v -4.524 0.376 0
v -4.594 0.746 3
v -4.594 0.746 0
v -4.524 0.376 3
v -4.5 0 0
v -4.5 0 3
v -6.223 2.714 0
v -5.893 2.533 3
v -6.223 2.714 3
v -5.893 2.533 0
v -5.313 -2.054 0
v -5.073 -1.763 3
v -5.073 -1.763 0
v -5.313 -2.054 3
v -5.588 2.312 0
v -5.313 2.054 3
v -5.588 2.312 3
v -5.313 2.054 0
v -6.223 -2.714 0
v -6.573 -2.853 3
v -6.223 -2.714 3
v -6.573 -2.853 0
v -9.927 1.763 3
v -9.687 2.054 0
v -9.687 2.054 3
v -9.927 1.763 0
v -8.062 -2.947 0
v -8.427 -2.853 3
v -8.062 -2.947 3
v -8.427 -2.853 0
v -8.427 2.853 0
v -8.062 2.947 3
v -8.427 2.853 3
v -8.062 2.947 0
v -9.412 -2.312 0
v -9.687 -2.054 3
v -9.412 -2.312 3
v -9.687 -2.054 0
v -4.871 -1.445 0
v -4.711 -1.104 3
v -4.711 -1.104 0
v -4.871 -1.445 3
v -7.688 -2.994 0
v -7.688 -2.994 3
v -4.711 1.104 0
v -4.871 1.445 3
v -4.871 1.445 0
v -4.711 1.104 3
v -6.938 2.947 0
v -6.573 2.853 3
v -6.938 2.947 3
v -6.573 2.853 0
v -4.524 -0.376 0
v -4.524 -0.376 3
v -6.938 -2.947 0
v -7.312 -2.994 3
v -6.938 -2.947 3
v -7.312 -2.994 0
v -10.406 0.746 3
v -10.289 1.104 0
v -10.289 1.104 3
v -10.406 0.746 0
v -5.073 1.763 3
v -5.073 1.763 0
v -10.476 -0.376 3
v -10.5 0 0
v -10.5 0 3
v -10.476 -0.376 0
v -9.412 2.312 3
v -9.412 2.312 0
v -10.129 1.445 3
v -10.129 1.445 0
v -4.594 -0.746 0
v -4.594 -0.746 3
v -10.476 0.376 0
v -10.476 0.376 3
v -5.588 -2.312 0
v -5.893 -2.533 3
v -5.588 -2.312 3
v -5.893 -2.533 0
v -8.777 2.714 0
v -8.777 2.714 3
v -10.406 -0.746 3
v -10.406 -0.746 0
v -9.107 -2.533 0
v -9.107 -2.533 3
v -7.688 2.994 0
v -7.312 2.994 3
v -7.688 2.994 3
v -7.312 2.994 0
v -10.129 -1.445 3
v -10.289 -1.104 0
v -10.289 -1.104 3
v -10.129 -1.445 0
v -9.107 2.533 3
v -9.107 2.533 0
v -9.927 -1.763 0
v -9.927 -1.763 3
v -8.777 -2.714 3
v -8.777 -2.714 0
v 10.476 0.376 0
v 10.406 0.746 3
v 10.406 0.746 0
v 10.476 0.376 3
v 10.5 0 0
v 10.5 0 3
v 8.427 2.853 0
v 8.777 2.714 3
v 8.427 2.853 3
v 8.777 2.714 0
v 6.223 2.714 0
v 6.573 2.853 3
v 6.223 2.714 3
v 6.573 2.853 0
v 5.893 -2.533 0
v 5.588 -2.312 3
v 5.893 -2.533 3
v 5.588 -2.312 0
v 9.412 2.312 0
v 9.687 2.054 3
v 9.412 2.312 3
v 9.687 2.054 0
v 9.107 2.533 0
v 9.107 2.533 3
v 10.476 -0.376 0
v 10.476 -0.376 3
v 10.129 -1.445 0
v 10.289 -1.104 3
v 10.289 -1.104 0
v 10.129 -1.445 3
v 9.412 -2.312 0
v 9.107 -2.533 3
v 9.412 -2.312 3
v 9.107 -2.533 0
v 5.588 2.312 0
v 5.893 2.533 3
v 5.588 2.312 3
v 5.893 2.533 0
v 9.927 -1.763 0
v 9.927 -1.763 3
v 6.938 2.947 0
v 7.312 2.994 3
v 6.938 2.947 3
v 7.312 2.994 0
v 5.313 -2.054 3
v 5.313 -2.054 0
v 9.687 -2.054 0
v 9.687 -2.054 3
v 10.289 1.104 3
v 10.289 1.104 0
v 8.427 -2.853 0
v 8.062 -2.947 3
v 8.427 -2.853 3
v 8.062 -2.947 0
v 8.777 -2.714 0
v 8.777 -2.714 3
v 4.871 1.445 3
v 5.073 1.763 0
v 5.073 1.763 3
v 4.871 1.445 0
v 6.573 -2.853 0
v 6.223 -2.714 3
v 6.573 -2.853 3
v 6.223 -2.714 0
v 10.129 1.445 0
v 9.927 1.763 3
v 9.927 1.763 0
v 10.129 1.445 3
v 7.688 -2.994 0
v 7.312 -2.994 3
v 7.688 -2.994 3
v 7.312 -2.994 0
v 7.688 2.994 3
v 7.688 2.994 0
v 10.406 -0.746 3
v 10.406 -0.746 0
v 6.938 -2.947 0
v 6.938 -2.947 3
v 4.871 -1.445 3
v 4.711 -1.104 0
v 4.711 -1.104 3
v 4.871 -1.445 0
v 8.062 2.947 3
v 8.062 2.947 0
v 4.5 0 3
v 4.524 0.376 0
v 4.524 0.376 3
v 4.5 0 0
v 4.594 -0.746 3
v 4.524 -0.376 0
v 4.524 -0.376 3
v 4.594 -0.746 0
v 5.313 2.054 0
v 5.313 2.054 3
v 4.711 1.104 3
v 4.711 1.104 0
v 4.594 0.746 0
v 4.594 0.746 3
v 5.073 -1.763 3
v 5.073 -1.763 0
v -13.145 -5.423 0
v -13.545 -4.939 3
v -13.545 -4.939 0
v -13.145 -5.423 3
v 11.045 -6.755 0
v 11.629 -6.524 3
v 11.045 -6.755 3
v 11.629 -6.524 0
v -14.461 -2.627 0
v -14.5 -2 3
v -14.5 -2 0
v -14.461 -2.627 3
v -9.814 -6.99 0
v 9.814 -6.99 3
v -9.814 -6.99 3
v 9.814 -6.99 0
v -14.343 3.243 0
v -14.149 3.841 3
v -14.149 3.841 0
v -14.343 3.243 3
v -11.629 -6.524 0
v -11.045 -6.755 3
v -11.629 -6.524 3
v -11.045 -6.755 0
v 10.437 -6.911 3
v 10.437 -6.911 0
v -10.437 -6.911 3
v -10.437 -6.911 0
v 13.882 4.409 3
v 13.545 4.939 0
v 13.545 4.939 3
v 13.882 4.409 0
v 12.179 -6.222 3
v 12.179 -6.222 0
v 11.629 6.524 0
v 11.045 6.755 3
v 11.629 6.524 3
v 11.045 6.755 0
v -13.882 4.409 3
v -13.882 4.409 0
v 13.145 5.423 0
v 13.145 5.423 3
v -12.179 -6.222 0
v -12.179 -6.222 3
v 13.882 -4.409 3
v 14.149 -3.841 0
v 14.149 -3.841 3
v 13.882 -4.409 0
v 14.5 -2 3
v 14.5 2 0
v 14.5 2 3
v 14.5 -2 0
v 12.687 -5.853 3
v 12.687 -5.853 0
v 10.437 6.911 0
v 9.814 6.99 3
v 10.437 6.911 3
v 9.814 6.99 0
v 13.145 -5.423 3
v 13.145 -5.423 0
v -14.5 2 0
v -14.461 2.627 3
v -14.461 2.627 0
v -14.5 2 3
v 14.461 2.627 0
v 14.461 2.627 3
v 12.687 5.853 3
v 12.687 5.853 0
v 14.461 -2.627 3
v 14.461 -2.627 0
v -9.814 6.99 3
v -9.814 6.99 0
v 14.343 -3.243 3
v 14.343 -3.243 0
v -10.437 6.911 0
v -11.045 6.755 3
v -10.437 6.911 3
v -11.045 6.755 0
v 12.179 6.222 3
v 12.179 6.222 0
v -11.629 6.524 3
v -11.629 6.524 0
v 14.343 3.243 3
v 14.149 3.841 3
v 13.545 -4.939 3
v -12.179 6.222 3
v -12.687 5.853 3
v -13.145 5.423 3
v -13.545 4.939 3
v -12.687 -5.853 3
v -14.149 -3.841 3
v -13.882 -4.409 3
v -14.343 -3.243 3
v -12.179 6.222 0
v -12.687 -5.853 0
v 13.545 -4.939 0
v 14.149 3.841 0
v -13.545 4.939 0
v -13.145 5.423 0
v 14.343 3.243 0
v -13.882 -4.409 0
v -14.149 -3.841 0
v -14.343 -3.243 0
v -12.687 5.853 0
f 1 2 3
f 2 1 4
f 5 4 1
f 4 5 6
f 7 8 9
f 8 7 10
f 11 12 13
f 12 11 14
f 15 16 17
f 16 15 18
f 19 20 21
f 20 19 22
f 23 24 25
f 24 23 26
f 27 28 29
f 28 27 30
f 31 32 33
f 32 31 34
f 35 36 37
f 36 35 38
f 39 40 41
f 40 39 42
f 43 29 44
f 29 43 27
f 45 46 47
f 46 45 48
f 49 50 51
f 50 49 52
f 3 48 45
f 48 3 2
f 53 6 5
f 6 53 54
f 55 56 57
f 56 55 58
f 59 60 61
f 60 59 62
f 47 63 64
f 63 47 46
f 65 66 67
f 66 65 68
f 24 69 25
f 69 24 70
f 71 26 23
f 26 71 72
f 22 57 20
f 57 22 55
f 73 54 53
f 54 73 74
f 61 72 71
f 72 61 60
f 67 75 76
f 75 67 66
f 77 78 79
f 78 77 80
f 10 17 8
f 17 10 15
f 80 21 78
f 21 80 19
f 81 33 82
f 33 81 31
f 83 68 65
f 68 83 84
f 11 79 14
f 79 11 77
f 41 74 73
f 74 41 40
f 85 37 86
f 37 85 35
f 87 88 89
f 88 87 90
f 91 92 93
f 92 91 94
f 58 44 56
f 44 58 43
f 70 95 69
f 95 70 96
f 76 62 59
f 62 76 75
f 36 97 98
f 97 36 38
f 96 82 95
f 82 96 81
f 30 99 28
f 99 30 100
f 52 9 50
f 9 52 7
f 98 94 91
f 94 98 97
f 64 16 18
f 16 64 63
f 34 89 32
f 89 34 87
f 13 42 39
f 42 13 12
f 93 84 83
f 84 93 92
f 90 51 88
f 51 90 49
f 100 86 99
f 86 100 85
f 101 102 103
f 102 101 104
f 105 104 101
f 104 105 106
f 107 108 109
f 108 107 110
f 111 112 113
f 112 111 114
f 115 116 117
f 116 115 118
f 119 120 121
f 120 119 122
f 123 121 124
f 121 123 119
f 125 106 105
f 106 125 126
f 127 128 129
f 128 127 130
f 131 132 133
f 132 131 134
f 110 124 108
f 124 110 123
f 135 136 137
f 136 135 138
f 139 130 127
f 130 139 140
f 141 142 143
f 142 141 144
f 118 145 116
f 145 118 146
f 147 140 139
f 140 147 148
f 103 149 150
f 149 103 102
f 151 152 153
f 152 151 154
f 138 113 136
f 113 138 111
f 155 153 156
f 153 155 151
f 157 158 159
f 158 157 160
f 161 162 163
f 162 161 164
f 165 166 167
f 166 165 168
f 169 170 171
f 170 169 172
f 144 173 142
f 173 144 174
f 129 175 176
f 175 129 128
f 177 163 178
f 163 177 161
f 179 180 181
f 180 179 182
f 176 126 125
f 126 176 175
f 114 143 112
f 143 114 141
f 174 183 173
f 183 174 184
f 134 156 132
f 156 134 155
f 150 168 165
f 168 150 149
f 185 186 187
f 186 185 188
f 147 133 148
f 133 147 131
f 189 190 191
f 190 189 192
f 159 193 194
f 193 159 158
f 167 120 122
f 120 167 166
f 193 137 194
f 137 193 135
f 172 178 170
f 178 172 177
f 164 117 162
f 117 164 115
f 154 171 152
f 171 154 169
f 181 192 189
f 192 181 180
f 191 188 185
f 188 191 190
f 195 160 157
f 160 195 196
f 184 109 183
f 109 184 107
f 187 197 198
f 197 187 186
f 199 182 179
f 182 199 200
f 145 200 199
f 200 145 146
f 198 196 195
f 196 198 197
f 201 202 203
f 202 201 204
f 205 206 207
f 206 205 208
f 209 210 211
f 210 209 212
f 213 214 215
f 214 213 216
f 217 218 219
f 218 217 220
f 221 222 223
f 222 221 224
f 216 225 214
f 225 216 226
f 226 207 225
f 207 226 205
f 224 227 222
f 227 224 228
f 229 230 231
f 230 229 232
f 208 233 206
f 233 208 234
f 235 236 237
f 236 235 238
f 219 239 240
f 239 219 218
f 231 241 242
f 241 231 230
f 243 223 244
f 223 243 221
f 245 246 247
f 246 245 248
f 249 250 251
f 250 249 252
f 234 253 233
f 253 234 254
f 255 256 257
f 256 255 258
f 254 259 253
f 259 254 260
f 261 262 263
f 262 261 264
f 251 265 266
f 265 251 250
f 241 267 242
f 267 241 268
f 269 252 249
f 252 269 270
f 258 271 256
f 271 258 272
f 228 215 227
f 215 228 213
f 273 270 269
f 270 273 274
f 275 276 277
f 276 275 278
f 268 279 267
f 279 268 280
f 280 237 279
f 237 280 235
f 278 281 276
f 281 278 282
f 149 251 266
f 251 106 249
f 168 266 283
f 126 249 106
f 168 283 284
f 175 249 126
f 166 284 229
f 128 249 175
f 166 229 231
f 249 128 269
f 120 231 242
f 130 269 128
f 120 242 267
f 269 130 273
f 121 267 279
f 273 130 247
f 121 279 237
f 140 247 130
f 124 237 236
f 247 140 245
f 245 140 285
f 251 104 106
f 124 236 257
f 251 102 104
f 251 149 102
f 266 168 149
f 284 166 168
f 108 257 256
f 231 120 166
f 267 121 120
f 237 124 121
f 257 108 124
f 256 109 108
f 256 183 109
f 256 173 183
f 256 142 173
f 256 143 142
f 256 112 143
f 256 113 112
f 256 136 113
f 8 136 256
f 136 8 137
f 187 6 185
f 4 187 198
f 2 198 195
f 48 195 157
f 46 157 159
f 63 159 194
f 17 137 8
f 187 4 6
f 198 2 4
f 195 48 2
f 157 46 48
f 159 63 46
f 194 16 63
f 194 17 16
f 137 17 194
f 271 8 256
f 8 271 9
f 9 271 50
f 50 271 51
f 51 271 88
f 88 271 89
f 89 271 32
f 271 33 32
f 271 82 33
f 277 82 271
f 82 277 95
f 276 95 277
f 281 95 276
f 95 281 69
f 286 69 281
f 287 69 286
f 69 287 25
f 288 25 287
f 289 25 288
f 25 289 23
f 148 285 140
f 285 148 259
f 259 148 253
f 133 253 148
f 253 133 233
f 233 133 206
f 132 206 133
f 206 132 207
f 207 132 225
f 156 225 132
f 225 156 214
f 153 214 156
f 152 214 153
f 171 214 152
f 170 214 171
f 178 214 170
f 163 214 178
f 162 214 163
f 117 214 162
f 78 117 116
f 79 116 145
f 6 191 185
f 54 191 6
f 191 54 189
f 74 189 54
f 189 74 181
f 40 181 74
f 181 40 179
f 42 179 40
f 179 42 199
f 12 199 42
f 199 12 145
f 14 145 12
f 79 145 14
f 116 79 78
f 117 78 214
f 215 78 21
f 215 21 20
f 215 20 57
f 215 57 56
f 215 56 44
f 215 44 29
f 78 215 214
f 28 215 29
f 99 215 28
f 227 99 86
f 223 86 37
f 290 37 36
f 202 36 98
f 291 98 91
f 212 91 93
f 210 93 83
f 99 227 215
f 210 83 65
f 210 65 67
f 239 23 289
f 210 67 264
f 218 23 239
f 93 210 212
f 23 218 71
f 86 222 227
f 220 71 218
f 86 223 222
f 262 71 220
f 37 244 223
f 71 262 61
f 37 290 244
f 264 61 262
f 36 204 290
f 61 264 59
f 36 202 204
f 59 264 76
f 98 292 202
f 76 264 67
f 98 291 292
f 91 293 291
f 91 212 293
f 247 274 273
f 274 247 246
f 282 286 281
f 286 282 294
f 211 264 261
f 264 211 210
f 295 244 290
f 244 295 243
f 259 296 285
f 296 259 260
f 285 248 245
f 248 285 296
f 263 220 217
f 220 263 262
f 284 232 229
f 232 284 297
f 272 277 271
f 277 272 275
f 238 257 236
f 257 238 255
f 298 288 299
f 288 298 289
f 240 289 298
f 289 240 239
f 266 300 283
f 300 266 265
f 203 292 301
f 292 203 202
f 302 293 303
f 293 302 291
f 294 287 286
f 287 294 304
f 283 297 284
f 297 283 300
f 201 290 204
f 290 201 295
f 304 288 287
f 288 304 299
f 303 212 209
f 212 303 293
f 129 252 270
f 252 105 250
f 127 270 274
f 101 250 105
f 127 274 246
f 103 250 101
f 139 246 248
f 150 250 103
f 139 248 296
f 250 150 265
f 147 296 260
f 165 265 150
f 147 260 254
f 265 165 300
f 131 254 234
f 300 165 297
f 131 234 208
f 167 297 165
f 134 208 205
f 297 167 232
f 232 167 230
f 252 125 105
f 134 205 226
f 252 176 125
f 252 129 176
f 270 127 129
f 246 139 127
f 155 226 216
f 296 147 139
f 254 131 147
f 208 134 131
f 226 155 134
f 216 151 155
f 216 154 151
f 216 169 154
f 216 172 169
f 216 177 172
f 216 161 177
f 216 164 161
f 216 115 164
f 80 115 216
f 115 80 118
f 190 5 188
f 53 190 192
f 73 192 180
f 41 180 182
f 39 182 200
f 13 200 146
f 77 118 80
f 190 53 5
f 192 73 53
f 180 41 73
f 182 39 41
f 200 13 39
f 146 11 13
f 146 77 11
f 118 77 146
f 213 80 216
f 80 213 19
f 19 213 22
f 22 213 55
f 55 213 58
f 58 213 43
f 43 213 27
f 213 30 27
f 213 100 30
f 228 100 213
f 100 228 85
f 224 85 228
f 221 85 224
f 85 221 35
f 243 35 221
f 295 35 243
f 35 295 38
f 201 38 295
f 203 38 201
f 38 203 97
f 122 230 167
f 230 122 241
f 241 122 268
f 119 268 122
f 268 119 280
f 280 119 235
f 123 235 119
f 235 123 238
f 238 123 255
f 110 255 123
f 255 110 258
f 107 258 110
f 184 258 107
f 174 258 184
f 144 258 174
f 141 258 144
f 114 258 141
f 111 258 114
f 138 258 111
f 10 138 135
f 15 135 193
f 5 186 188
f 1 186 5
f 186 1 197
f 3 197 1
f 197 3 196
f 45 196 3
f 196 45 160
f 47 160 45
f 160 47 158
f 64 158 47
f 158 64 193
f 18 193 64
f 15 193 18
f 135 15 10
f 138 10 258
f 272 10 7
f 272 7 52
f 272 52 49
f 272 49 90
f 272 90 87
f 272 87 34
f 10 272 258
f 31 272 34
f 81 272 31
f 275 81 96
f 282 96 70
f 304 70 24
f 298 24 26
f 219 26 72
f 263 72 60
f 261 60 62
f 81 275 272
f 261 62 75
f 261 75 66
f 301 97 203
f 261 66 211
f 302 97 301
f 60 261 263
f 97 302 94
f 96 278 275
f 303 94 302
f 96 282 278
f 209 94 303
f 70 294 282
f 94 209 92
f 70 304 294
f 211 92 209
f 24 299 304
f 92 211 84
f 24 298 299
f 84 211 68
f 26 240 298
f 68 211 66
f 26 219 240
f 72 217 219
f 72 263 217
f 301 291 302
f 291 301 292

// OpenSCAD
// Generated by SolidPython 1.1.3 on 2023-03-12 21:50:46
$fn = 50;


difference() {
	union() {
		translate(v = [0, 0, 0]) {
			rotate(a = [0, 0, 0]) {
				hull() {
					translate(v = [-9.5000000000, 2.0000000000, 0]) {
						rotate(a = [0, 0, 0]) {
							translate(v = [0, 0, 0]) {
								rotate(a = [0, 0, 0]) {
									cylinder(h = 3, r = 5);
								}
							}
						}
					}
					translate(v = [9.5000000000, 2.0000000000, 0]) {
						rotate(a = [0, 0, 0]) {
							translate(v = [0, 0, 0]) {
								rotate(a = [0, 0, 0]) {
									cylinder(h = 3, r = 5);
								}
							}
						}
					}
					translate(v = [-9.5000000000, -2.0000000000, 0]) {
						rotate(a = [0, 0, 0]) {
							translate(v = [0, 0, 0]) {
								rotate(a = [0, 0, 0]) {
									cylinder(h = 3, r = 5);
								}
							}
						}
					}
					translate(v = [9.5000000000, -2.0000000000, 0]) {
						rotate(a = [0, 0, 0]) {
							translate(v = [0, 0, 0]) {
								rotate(a = [0, 0, 0]) {
									cylinder(h = 3, r = 5);
								}
							}
						}
					}
				}
			}
		}
	}
	union() {
		translate(v = [-7.5000000000, 0.0000000000, 0]) {
			rotate(a = [0, 0, 0]) {
				translate(v = [0, 0, -50]) {
					rotate(a = [0, 0, 0]) {
						cylinder(h = 100, r = 3.0000000000);
					}
				}
			}
		}
		translate(v = [7.5000000000, 0.0000000000, 0]) {
			rotate(a = [0, 0, 0]) {
				translate(v = [0, 0, -50]) {
					rotate(a = [0, 0, 0]) {
						cylinder(h = 100, r = 3.0000000000);
					}
				}
			}
		}
	}
}
/***********************************************
*********      SolidPython code:      **********
************************************************
 
from solid import *
import os
import subprocess

import oomB

import opsc_library_gen

mode = "laser"
#mode = "3d_print"

defined_objects = {}

radius_dict = {}
countersunk_dict = {}


def set_mode(m):
    global mode
    mode = m
    radius_dict['M6'] = 6.5/2
    radius_dict['M3'] = 3.3/2
    if mode == "laser":
        radius_dict['M6'] = 6/2
        radius_dict['M3'] = 3/2

    countersunk_dict['M3'] = {}
    countersunk_dict['M3']['little_rad'] = radius_dict['M3']
    countersunk_dict['M3']['big_rad'] = (5.5+0.6)/2
    if mode == "laser":
        countersunk_dict['M3']['big_rad'] = (4.75+0.6)/2
        countersunk_dict['M3']['little_rad'] = (4.75+0.6)/2

    countersunk_dict['M3']['height'] = 1.7


def opsc_make_object(filename, objects, save_type="none",resolution=50, layers = 1, tilediff = 200, mode="laser", overwrite=True):
    if overwrite or not os.path.exists(filename):
        set_mode(mode)
        save_type = save_type.lower()
        os.makedirs(os.path.dirname(filename), exist_ok=True)
        final_object = opsc_get_object(objects, mode = mode)
        # Save the final object to the specified filename    
        scad_render_to_file(final_object, filename, file_header='$fn = %s;' % resolution, include_orig_code=True)
        if mode == "laser":
            filename_laser = filename.replace(".scad","-flat.scad")
            scad_render_to_file(getLaser(final_object, layers=layers, tilediff=tilediff), filename_laser, file_header='$fn = %s;' % resolution, include_orig_code=True)
            if save_type == "all":
                saveToAll(filename_laser)
            elif save_type == "dxf":
                saveToDxf(filename_laser)
        if save_type == "all":
            saveToAll(filename)
        elif save_type == "dxf":
            saveToDxf(filename)


def opsc_get_object(objects, mode = "laser"):
    # Create the solidpython objects only include the positive objects and if they don't have inclusion or their inclusion is either all or mode
    # Initialize an empty list to store the results
    positive_objects = []

    # Iterate over the "objects" list
    for obj in objects:
        # Check if the current object has a "type" key with a value of "positive"
        if obj['type'] == 'positive':
            # Check if the current object has an "inclusion" key and its value matches "mode",
            # or if the current object does not have an "inclusion" key at all
            if not 'inclusion' in obj or obj['inclusion'] == "all" or obj['inclusion'] == mode:
                # Call the "get_opsc_item" function with the current object as an argument
                opsc_item = get_opsc_item(obj)
                # Add the result to the "positive_objects" list
                positive_objects.append(opsc_item)
# Initialize an empty list to store the results
    negative_objects = []

    # Iterate over the "objects" list
    for obj in objects:
        # Check if the current object has a "type" key with a value of "negative"
        if obj['type'] == 'negative':
            # Check if the current object has an "inclusion" key and its value matches "mode",
            # or if the current object does not have an "inclusion" key at all
            if not 'inclusion' in obj or obj['inclusion'] == "all" or obj['inclusion'] == mode:
                # Call the "get_opsc_item" function with the current object as an argument
                opsc_item = get_opsc_item(obj)
                # Add the result to the "negative_objects" list
                negative_objects.append(opsc_item)
    
    #positive_objects = [get_opsc_item(obj) for obj in objects if obj['type'] == 'positive']
    #negative_objects = [get_opsc_item(obj) for obj in objects if obj['type'] == 'negative']
    # Union the positive objects
    positive_object = union()(*positive_objects)
    # Union the negative objects
    negative_object = union()(*negative_objects)
    # Create the final object by subtracting the negative objects from the positive objects
    return difference()(positive_object, negative_object)

def get_opsc_item(params):
    # A dictionary to map radius string values to numerical values
    #radius_dict = {'small': 5, 'medium': 10, 'large': 15}
    # An array of function names for basic shapes
    basic_shapes = ['cube', 'sphere', 'cylinder']
    
    # An array of function names for other shapes
    other_shapes = ['hole', 'slot', 'rounded_rectangle', 'countersunk']
    


    # Convert radius to r if present, and remove radius from the params dictionary
    if 'radius' in params:
        if isinstance(params['radius'], str):
            # Use the radius_dict to map the radius string value to a numerical value
            params['r'] = radius_dict[params['radius']]
        else:
            params['r'] = params['radius']
        del params['radius']
    

    # Check if the object type is a basic shape
    if params['shape'] in basic_shapes:
        # Remove shape and unexpected dictionary values
        allowed_keys = {'size', 'r', 'r1', 'r2', 'd', 'h', 'rw', 'rh', 'dw', 'dh'}
        shape_params = {k: v for k, v in params.items() if k in allowed_keys}

        # Call the corresponding function for the shape parameter, using ** notation to pass the shape_params dictionary as keyword arguments
        return get_opsc_transform(params,globals()[params['shape']](**shape_params))
    
    # If the object type is not a basic shape, check if it's a defined object or one of the other shapes
    elif params['shape'] in other_shapes:
        # Call the corresponding function for the shape parameter, passing the params dictionary as an argument
        p2 = copy.deepcopy(params)
        p2["pos"] = [0,0,0]
        return get_opsc_transform(params,globals()[params['shape']](p2))
    
    # If the object is not a basic shape or a defined object, try to import it from a .scad file
    else:
        obj = defined_objects[params['shape']]
        return get_opsc_transform(params,obj)

def get_opsc_transform(params, solid_obj):
    # Rotate the object based on the 'rot' field in the params dictionary, or the 'rotX', 'rotY', and 'rotZ' fields if 'rot' is not present
    rot = params.get('rot', [])
    if rot:
        rotX, rotY, rotZ = rot
    else:
        rotX = params.get('rotX', 0)
        rotY = params.get('rotY', 0)
        rotZ = params.get('rotZ', 0)
    solid_obj = rotate([rotX, rotY, rotZ])(solid_obj)

    # Translate the object based on the 'pos' field in the params dictionary, or the 'x', 'y', and 'z' fields if 'pos' is not present
    pos = params.get('pos', [])
    if pos:
        x, y, z = pos
    else:
        x = params.get('x', 0)
        y = params.get('y', 0)
        z = params.get('z', 0)
    solid_obj = translate([x, y, z])(solid_obj)
    return solid_obj


import random

def opsc_easy_array(type, shape, repeats, pos_start, shift_arr, **kwargs):
    for i in range(0,3):
        repeats.append(1)
        pos_start.append(0)
        shift_arr.append(0)
    return_objects = []

    for x in range(0,repeats[0]):
        for y in range(0,repeats[1]):
            for z in range(0,repeats[2]):
                return_objects.append(opsc_easy(type, shape, pos=[pos_start[0]+x*shift_arr[0],pos_start[1]+y*shift_arr[1],pos_start[2]+z*shift_arr[2]], **kwargs))
    return return_objects                



def opsc_easy(type, shape, **kwargs):
    obj = {
        'type': type,
        'shape': shape
    }
    for param in ['size', 'r', 'r1', 'r2', 'd', 'h', 'rw', 'rh', 'dw', 'dh', 'pos', 'x', 'y', 'z', 'rot', 'rotX', 'rotY', 'rotZ', "w", "inclusion"]:
        if param in kwargs:
            obj[param] = kwargs[param]
    return obj

def hole(params):
    p2 = copy.deepcopy(params)  
    # Check if the radius is a string and replace it with the corresponding value from the dictionary
    if isinstance(p2['r'], str):
        p2['r'] = radius_dict[p2['r']]
    
    # Set the height to 100 if not specified
    if 'h' not in p2:
        p2['h'] = 100
        p2["pos"] = [0,0,-50]
    p2["center"] = True
    # Create the cylinder object
    p2["shape"] = "cylinder"
    p2["type"] = "positive"

    return get_opsc_item(p2)

import copy

def countersunk(params):
    p2 = copy.deepcopy(params)
    counter_rad = p2['r']
    p2['r'] = radius_dict[p2['r']]
    hp = copy.deepcopy(p2)
    hp["type"] = "positive"
    hp["shape"] = "hole"
    del hp["rot"]
    hol = get_opsc_item(hp)
    
    cp = copy.deepcopy(p2)
    cp["h"] = countersunk_dict[counter_rad]["height"]
    cp["r2"] = countersunk_dict[counter_rad]["little_rad"]
    cp["r1"] = countersunk_dict[counter_rad]["big_rad"]
    del cp["r"]
    del cp["rot"]
    cp["type"] = "positive"
    cp["shape"] = "cylinder"
    cp["pos"] = [0,0,0]

    top = get_opsc_item(cp)
    return union()(hol,top)



def slot(params):  
    p2 = copy.deepcopy(params) 
    if isinstance(p2['r'], str):
        p2['r'] = radius_dict[p2['r']]
    p2["type"] = "positive"
    p2["shape"] = "hole"
    del p2["rot"]
    p2["pos"] = [0,0,0]
    left = copy.deepcopy(p2)
    right = copy.deepcopy(p2)
    left["pos"][0] = p2["w"] / 2 - p2["r"] 
    
    right["pos"][0] = -p2["w"] / 2 + p2["r"] 
    pass
    leftObj = get_opsc_item(left)
    rightObj = get_opsc_item(right)
    return hull()(leftObj, rightObj)

def rounded_rectangle(params):   
    p2 = copy.deepcopy(params) 
    p2["h"] = p2["size"][2]
    p2["pos"] = p2.get("pos", [0, 0, 0]) 
    p2["type"] = "positive"
    p2["shape"] = "hole"
    p2["pos"] = [0,0,0]
    
    if 'rot' in p2:
        del p2["rot"]   
    if 'r' not in p2:
        p2["r"] = 5 
    tl = copy.deepcopy(p2)
    tr = copy.deepcopy(p2)
    bl = copy.deepcopy(p2)
    br = copy.deepcopy(p2)
    tl["pos"][0] = -(p2["size"][0] - p2["r"]*2)/2
    tl["pos"][1] = (p2["size"][1] - p2["r"]*2)/2
    tr["pos"][0] = (p2["size"][0] - p2["r"]*2)/2
    tr["pos"][1] = (p2["size"][1] - p2["r"]*2)/2
    bl["pos"][0] = -(p2["size"][0] - p2["r"]*2)/2
    bl["pos"][1] = -(p2["size"][1] - p2["r"]*2)/2
    br["pos"][0] = (p2["size"][0] - p2["r"]*2)/2
    br["pos"][1] = -(p2["size"][1] - p2["r"]*2)/2
    del tl["size"]
    del tr["size"]
    del bl["size"]
    del br["size"]
    tlo = get_opsc_item(tl)
    tro = get_opsc_item(tr)
    blo = get_opsc_item(bl)
    bro = get_opsc_item(br)    
    return hull()(tlo, tro, blo, bro)



def import_scad_object(filename):
    # Import the .scad file and convert it to a solidpython object
    #filename = "parts"
    obj = import_scad(filename)
    return obj.main()
    


import os
import solid as solidpython

# A dictionary to store the defined objects


def load_scad_objects():
    opsc_library_gen.gen_library(defined_objects)

import random

def test(num_objects):
    objects = []
    for i in range(num_objects):
        # Choose a random shape
        #shape = random.choice(['cube', 'sphere', 'cylinder', 'hole', 'slot', "rounded_rectangle"])
        shape = random.choice(["rounded_rectangle"])

        # Choose a random type
        type = random.choice(['positive', 'negative'])
        
        # Create an empty object dictionary
        obj = {'shape': shape, 'type': type}
        
        # Set shape-specific parameters
        if obj['shape'] in ['cube']:
            obj['size'] =  [random.uniform(5, 15), random.uniform(5, 15), random.uniform(5, 15)]
        if obj['shape'] in ['rounded_rectangle']:
            obj['size'] =  [random.uniform(5, 15), random.uniform(5, 15), random.uniform(5, 15)]
            obj['r'] = random.uniform(0.5, 5)
        elif obj['shape'] == 'sphere':
            obj['r'] = random.uniform(5, 15)
        elif obj['shape'] in ['cylinder', 'hole']:
            obj['r'] = random.uniform(0.5, 5)
            obj['h'] = random.uniform(5, 15)
        elif obj['shape'] == 'slot':
            obj['r'] = random.uniform(0.5, 5)
            obj['h'] = random.uniform(5, 15)
            obj['w'] = random.uniform(5, 15)
        
        # Set a random position and rotation
        obj['pos'] = [random.uniform(-20, 20), random.uniform(-20, 20), random.uniform(-20, 20)]
        obj['rot'] = [random.uniform(-180, 180), random.uniform(-180, 180), random.uniform(-180, 180)]
        
        # Add the object to the list
        objects.append(obj)
    return objects

####### old file saving
def saveToAll(fileIn):
    saveToDxf(fileIn)
    saveToPng(fileIn)
    saveToStl(fileIn)
    saveToSvg(fileIn)

def saveToDxf(fileIn, fileOut="", copy_to_laser=True):
    if fileOut == "":
        fileOut = fileIn.replace(".scad",".dxf")
    saveToFile(fileIn, fileOut)


    
def saveToPng(fileIn, fileOut="",extra="--render"):
    if fileOut == "":
        fileOut = fileIn.replace(".scad",".png")
    saveToFile(fileIn, fileOut)

def saveToStl(fileIn, fileOut=""):
    if fileOut == "":
        fileOut = fileIn.replace(".scad",".stl")
    saveToFile(fileIn, fileOut)
    
def saveToSvg(fileIn, fileOut=""):
    if fileOut == "":
        fileOut = fileIn.replace(".scad",".svg")
    saveToFile(fileIn, fileOut)

def saveToFile(fileIn, fileOut,extra=""):
    #extra = extra + " --colorscheme Tomorrow"

    launchStr = 'openscad -o "' + fileOut + '"' + extra + ' "' + fileIn + '"'
    if ".png" in fileOut:
        launchStr = launchStr + " --render"
    print("            saveToFile launch string: " + launchStr)
    subprocess.run(launchStr)
    x=0

def getLaser(final_object,start=1.5,layers=1,thickness=3,tilediff=200):
        rv= []

        for x in range(layers):
            rv.append(translate([0,x*tilediff,0])(
                    projection()(
                        intersection()(translate([-500,-500,start+x*thickness])(cube(size=[1000,1000,0.1])),
                            final_object
                        )
                    )
            )
            )
            
        return union()(rv)

set_mode("laser")
load_scad_objects() 
 
************************************************/
